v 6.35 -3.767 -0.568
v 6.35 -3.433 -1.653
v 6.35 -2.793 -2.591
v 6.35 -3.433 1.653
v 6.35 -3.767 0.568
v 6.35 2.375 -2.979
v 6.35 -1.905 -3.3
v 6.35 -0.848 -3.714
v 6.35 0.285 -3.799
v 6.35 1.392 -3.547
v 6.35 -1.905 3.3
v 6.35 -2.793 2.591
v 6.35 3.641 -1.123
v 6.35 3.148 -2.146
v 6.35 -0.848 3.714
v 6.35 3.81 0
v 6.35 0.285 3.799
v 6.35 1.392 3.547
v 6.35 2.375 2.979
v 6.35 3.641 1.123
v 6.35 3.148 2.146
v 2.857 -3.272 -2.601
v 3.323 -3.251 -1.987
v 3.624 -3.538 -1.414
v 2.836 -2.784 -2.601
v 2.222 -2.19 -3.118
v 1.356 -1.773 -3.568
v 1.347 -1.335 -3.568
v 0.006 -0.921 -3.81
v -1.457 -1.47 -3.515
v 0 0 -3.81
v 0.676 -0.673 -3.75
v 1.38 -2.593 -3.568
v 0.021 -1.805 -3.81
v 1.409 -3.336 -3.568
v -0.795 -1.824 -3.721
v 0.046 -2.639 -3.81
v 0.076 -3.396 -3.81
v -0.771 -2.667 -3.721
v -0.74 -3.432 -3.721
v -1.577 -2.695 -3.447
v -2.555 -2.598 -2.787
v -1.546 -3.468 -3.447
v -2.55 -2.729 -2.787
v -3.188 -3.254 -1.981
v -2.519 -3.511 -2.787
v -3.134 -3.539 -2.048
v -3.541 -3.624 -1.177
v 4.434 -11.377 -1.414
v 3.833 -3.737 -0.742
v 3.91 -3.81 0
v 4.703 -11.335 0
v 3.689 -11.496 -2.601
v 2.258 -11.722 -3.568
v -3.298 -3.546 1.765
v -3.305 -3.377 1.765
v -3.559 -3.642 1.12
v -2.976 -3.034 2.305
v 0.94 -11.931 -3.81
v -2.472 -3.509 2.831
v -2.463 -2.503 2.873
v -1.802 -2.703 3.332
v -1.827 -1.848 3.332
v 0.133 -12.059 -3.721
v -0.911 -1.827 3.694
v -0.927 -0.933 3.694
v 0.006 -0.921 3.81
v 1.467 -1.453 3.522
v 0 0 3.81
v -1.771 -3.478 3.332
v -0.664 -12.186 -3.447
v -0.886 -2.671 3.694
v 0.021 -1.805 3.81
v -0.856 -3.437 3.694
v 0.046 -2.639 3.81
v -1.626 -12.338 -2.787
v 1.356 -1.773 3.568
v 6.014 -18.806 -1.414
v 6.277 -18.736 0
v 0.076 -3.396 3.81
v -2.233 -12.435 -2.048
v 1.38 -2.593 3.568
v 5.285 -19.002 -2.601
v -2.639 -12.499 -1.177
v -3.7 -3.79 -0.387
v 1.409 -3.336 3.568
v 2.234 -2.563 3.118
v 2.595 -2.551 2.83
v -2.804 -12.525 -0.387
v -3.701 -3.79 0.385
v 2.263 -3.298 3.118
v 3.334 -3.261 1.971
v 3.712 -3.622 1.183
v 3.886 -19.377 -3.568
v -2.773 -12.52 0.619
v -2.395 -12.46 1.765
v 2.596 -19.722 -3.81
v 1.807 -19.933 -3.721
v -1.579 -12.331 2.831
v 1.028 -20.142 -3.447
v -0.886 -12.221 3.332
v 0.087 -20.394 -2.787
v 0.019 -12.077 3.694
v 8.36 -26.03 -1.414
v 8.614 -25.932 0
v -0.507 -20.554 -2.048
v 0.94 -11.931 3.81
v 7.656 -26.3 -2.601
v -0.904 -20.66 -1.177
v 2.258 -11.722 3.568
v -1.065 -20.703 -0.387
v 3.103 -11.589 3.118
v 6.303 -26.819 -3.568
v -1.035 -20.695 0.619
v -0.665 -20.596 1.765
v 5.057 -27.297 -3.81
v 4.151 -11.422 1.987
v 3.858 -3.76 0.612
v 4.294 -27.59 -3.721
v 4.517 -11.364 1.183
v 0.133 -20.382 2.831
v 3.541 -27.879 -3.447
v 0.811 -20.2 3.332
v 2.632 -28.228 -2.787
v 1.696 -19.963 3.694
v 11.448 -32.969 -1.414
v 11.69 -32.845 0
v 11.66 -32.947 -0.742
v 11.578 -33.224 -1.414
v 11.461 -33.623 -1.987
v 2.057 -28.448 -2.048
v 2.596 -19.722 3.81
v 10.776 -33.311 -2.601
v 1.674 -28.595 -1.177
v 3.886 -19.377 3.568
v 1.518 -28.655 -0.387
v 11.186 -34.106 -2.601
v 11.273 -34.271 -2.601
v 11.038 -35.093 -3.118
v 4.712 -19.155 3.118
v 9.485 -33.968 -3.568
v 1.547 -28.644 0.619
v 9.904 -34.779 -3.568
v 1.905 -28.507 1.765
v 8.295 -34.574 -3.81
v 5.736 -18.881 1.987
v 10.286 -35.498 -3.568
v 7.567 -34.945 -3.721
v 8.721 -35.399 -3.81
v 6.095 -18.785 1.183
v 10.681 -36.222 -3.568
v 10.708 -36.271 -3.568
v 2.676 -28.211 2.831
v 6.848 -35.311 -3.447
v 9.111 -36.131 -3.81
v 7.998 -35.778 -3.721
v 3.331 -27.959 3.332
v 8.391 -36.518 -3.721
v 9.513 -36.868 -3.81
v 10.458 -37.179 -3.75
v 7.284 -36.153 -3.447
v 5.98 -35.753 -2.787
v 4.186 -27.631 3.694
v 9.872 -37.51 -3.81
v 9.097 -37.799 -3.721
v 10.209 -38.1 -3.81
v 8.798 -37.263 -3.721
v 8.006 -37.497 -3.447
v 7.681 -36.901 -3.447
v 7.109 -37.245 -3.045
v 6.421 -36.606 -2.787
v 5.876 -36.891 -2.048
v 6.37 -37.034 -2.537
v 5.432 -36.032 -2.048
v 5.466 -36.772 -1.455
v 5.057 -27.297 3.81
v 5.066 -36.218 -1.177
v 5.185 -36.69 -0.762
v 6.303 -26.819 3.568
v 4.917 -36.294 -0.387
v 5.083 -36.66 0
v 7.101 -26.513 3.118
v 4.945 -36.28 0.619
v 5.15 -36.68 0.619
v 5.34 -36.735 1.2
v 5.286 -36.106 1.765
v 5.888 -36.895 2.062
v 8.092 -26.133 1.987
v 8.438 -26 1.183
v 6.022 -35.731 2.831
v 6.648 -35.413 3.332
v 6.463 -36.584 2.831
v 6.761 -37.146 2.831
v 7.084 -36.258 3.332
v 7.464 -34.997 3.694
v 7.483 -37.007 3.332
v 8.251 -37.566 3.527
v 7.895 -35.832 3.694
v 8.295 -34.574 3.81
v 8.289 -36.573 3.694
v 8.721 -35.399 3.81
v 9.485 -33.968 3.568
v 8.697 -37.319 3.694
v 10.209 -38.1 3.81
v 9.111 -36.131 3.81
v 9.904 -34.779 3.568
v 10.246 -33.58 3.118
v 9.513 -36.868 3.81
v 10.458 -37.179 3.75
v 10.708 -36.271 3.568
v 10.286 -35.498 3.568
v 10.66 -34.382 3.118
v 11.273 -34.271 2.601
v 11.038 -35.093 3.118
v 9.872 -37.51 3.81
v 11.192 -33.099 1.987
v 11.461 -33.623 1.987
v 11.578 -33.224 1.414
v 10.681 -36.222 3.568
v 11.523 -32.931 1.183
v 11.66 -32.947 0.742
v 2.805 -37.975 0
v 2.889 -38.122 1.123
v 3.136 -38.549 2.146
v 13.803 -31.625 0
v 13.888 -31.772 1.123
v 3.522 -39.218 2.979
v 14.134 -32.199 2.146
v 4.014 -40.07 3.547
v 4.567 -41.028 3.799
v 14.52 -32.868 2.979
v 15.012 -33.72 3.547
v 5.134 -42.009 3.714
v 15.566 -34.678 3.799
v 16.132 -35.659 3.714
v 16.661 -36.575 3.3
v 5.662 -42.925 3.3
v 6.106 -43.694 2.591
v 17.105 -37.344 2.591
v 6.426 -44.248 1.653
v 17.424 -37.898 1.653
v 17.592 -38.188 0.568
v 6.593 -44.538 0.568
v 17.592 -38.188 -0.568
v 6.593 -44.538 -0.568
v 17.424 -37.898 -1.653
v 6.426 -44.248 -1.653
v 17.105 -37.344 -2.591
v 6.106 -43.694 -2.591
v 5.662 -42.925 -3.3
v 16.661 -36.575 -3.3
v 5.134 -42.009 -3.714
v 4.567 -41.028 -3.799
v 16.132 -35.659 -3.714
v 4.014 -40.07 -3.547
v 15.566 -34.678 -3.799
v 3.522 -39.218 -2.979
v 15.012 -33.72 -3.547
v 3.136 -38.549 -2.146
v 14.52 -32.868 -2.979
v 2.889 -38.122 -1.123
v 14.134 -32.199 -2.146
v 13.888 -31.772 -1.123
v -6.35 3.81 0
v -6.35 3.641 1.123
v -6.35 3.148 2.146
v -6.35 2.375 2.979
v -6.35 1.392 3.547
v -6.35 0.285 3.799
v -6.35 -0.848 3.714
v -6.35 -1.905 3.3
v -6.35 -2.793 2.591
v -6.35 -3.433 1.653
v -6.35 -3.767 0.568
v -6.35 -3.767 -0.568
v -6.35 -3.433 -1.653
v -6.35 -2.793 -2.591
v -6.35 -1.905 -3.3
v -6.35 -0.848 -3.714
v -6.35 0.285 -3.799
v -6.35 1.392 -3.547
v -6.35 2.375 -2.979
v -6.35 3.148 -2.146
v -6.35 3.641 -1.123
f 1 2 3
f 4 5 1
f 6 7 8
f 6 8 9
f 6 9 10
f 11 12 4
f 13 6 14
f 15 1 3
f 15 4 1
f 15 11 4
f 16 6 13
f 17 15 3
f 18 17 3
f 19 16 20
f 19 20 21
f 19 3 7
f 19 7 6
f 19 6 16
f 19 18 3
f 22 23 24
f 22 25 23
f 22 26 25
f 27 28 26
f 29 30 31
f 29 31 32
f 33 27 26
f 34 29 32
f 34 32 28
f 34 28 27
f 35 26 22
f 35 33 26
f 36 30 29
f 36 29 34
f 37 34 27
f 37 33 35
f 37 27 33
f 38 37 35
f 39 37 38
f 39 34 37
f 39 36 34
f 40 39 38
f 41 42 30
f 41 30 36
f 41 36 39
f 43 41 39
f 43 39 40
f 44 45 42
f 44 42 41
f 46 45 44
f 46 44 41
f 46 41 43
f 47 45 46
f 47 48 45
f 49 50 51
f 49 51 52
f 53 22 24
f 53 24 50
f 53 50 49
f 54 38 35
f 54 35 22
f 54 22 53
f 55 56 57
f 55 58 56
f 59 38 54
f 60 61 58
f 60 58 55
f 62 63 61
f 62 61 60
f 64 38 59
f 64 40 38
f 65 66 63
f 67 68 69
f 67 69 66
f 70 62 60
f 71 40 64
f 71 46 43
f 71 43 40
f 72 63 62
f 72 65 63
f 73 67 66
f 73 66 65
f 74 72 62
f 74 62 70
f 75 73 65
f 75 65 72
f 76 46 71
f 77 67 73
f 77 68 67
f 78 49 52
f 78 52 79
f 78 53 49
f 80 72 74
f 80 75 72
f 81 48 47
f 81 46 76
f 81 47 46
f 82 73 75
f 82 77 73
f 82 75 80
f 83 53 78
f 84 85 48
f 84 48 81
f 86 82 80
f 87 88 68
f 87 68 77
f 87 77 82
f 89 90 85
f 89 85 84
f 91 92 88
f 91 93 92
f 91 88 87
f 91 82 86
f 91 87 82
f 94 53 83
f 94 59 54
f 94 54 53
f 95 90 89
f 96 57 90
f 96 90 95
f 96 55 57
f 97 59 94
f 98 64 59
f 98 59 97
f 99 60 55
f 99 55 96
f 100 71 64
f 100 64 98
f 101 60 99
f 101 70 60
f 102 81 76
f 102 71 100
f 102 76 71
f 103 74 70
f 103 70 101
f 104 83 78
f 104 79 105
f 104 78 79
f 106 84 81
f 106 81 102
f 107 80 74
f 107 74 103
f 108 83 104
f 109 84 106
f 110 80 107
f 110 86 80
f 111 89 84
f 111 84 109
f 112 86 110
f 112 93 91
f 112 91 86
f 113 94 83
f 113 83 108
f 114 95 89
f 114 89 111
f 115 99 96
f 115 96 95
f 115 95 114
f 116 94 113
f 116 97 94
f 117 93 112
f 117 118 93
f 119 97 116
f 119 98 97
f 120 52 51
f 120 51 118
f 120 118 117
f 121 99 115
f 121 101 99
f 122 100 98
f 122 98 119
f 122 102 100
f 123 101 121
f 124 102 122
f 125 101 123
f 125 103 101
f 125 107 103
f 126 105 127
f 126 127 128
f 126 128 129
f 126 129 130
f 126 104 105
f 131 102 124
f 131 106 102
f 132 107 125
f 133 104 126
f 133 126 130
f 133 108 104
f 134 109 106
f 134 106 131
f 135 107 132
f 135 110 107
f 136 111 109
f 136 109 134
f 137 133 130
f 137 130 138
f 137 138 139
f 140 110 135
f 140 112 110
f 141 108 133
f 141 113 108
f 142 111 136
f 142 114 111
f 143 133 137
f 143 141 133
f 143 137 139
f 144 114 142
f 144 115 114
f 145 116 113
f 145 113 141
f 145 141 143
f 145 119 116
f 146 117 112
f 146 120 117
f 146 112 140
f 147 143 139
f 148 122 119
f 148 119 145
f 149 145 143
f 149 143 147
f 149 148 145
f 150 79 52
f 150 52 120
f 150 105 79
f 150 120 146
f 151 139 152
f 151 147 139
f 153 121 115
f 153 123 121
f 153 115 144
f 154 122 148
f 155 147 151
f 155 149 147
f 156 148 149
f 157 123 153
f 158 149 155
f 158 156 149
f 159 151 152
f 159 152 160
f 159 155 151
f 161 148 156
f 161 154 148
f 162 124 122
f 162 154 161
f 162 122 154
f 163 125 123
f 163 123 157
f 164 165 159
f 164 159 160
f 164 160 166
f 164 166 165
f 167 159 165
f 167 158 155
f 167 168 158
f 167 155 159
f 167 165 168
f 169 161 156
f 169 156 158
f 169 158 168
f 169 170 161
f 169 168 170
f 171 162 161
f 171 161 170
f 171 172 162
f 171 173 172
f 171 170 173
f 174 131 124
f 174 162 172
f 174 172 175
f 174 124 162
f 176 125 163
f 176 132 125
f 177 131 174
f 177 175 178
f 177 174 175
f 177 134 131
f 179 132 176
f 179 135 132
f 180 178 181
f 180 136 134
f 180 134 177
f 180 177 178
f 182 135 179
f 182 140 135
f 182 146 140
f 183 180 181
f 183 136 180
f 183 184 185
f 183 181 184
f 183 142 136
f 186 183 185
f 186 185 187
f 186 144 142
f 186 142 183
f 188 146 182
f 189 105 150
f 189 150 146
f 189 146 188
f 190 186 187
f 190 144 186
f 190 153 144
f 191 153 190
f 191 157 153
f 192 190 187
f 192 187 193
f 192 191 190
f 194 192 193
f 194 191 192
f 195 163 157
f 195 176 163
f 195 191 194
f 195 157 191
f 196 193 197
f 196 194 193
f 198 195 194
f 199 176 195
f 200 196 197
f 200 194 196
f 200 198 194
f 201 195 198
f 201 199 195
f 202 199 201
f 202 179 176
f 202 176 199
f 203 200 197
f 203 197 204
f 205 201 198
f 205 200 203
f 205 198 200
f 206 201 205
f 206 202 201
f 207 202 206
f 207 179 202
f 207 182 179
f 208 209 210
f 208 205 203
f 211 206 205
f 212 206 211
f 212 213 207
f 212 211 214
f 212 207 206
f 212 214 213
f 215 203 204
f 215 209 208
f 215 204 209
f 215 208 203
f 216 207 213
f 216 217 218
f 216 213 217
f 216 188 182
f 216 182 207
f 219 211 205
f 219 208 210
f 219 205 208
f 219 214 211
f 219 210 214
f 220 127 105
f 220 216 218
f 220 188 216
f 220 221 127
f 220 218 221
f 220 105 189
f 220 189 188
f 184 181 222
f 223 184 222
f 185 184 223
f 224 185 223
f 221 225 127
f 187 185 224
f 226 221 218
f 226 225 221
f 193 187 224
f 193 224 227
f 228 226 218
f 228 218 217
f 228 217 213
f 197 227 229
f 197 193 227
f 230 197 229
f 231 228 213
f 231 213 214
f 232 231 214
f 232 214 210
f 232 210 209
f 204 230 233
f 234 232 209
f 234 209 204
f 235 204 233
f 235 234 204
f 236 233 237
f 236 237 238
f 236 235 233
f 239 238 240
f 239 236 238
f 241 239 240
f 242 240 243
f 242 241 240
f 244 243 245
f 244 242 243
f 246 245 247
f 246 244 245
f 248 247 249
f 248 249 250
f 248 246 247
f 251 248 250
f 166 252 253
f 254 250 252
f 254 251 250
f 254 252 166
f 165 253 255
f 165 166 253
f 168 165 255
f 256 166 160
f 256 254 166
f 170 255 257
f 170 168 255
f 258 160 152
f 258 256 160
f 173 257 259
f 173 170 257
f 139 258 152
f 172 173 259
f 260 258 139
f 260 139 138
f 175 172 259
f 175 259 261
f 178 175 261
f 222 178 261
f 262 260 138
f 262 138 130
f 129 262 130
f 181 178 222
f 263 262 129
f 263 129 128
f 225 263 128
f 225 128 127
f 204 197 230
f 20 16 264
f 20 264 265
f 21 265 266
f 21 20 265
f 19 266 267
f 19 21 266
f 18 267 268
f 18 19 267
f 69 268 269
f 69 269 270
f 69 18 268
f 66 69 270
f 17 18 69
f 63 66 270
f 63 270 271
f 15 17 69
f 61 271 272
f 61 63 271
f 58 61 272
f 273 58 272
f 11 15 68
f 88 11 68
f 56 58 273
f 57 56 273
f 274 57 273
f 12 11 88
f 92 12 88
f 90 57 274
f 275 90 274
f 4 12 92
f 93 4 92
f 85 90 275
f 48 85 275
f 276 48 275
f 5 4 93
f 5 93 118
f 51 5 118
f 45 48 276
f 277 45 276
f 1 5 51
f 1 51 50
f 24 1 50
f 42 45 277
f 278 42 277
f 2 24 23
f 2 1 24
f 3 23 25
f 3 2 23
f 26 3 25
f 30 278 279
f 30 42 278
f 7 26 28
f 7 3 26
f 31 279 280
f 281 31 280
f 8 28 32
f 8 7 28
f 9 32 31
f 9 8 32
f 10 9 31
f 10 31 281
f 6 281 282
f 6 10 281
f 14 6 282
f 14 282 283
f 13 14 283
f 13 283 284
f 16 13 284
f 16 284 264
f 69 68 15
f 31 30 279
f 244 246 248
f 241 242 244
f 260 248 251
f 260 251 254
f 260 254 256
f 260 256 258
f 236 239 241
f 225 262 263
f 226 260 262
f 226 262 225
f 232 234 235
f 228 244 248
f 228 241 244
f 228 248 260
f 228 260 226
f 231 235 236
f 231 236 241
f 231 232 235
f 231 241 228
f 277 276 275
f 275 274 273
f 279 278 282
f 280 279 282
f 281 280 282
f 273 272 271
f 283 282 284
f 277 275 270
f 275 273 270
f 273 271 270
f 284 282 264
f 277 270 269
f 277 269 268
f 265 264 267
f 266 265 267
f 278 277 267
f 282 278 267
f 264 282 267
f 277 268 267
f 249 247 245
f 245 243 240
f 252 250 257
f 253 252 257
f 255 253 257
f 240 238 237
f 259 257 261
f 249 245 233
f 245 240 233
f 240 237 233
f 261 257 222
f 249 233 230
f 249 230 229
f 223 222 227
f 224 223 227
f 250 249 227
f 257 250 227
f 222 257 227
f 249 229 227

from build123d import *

# Parameters (mm, degrees)
F0_R     = 3.81
F3_R     = 3.81
F4_DEPTH = 6.35
F7_R     = 3.81
F8_DEPTH = 6.35


with BuildPart() as f2:
    # F2: sweep along a path in F1
    with BuildLine(Plane.XY) as f2_path:
        ThreePointArc((0, 0), (2.5964520368, -19.7220112368), (10.2088642316, -38.1))
    # F0 (on Front) → F2 (sweep)
    with BuildSketch(Plane.XZ):
        Circle(F0_R)
    sweep(path=f2_path.line)

    # F3 (on Right) → F4 (join, symmetric)
    with BuildSketch(Plane.YZ):
        Circle(F3_R)
    extrude(amount=F4_DEPTH, both=True)

    # F7 (on face) → F8 (join, symmetric)
    with BuildSketch(Plane(origin=(-8.8411357684, -5.1044321158, 0), x_dir=(-0.5, 0.8660254038, 0), z_dir=(0.8660254038, 0.5, 0))):
        with Locations((-38.1, 0)):
            Circle(F7_R)
    extrude(amount=F8_DEPTH, both=True)


solid = f2.part
